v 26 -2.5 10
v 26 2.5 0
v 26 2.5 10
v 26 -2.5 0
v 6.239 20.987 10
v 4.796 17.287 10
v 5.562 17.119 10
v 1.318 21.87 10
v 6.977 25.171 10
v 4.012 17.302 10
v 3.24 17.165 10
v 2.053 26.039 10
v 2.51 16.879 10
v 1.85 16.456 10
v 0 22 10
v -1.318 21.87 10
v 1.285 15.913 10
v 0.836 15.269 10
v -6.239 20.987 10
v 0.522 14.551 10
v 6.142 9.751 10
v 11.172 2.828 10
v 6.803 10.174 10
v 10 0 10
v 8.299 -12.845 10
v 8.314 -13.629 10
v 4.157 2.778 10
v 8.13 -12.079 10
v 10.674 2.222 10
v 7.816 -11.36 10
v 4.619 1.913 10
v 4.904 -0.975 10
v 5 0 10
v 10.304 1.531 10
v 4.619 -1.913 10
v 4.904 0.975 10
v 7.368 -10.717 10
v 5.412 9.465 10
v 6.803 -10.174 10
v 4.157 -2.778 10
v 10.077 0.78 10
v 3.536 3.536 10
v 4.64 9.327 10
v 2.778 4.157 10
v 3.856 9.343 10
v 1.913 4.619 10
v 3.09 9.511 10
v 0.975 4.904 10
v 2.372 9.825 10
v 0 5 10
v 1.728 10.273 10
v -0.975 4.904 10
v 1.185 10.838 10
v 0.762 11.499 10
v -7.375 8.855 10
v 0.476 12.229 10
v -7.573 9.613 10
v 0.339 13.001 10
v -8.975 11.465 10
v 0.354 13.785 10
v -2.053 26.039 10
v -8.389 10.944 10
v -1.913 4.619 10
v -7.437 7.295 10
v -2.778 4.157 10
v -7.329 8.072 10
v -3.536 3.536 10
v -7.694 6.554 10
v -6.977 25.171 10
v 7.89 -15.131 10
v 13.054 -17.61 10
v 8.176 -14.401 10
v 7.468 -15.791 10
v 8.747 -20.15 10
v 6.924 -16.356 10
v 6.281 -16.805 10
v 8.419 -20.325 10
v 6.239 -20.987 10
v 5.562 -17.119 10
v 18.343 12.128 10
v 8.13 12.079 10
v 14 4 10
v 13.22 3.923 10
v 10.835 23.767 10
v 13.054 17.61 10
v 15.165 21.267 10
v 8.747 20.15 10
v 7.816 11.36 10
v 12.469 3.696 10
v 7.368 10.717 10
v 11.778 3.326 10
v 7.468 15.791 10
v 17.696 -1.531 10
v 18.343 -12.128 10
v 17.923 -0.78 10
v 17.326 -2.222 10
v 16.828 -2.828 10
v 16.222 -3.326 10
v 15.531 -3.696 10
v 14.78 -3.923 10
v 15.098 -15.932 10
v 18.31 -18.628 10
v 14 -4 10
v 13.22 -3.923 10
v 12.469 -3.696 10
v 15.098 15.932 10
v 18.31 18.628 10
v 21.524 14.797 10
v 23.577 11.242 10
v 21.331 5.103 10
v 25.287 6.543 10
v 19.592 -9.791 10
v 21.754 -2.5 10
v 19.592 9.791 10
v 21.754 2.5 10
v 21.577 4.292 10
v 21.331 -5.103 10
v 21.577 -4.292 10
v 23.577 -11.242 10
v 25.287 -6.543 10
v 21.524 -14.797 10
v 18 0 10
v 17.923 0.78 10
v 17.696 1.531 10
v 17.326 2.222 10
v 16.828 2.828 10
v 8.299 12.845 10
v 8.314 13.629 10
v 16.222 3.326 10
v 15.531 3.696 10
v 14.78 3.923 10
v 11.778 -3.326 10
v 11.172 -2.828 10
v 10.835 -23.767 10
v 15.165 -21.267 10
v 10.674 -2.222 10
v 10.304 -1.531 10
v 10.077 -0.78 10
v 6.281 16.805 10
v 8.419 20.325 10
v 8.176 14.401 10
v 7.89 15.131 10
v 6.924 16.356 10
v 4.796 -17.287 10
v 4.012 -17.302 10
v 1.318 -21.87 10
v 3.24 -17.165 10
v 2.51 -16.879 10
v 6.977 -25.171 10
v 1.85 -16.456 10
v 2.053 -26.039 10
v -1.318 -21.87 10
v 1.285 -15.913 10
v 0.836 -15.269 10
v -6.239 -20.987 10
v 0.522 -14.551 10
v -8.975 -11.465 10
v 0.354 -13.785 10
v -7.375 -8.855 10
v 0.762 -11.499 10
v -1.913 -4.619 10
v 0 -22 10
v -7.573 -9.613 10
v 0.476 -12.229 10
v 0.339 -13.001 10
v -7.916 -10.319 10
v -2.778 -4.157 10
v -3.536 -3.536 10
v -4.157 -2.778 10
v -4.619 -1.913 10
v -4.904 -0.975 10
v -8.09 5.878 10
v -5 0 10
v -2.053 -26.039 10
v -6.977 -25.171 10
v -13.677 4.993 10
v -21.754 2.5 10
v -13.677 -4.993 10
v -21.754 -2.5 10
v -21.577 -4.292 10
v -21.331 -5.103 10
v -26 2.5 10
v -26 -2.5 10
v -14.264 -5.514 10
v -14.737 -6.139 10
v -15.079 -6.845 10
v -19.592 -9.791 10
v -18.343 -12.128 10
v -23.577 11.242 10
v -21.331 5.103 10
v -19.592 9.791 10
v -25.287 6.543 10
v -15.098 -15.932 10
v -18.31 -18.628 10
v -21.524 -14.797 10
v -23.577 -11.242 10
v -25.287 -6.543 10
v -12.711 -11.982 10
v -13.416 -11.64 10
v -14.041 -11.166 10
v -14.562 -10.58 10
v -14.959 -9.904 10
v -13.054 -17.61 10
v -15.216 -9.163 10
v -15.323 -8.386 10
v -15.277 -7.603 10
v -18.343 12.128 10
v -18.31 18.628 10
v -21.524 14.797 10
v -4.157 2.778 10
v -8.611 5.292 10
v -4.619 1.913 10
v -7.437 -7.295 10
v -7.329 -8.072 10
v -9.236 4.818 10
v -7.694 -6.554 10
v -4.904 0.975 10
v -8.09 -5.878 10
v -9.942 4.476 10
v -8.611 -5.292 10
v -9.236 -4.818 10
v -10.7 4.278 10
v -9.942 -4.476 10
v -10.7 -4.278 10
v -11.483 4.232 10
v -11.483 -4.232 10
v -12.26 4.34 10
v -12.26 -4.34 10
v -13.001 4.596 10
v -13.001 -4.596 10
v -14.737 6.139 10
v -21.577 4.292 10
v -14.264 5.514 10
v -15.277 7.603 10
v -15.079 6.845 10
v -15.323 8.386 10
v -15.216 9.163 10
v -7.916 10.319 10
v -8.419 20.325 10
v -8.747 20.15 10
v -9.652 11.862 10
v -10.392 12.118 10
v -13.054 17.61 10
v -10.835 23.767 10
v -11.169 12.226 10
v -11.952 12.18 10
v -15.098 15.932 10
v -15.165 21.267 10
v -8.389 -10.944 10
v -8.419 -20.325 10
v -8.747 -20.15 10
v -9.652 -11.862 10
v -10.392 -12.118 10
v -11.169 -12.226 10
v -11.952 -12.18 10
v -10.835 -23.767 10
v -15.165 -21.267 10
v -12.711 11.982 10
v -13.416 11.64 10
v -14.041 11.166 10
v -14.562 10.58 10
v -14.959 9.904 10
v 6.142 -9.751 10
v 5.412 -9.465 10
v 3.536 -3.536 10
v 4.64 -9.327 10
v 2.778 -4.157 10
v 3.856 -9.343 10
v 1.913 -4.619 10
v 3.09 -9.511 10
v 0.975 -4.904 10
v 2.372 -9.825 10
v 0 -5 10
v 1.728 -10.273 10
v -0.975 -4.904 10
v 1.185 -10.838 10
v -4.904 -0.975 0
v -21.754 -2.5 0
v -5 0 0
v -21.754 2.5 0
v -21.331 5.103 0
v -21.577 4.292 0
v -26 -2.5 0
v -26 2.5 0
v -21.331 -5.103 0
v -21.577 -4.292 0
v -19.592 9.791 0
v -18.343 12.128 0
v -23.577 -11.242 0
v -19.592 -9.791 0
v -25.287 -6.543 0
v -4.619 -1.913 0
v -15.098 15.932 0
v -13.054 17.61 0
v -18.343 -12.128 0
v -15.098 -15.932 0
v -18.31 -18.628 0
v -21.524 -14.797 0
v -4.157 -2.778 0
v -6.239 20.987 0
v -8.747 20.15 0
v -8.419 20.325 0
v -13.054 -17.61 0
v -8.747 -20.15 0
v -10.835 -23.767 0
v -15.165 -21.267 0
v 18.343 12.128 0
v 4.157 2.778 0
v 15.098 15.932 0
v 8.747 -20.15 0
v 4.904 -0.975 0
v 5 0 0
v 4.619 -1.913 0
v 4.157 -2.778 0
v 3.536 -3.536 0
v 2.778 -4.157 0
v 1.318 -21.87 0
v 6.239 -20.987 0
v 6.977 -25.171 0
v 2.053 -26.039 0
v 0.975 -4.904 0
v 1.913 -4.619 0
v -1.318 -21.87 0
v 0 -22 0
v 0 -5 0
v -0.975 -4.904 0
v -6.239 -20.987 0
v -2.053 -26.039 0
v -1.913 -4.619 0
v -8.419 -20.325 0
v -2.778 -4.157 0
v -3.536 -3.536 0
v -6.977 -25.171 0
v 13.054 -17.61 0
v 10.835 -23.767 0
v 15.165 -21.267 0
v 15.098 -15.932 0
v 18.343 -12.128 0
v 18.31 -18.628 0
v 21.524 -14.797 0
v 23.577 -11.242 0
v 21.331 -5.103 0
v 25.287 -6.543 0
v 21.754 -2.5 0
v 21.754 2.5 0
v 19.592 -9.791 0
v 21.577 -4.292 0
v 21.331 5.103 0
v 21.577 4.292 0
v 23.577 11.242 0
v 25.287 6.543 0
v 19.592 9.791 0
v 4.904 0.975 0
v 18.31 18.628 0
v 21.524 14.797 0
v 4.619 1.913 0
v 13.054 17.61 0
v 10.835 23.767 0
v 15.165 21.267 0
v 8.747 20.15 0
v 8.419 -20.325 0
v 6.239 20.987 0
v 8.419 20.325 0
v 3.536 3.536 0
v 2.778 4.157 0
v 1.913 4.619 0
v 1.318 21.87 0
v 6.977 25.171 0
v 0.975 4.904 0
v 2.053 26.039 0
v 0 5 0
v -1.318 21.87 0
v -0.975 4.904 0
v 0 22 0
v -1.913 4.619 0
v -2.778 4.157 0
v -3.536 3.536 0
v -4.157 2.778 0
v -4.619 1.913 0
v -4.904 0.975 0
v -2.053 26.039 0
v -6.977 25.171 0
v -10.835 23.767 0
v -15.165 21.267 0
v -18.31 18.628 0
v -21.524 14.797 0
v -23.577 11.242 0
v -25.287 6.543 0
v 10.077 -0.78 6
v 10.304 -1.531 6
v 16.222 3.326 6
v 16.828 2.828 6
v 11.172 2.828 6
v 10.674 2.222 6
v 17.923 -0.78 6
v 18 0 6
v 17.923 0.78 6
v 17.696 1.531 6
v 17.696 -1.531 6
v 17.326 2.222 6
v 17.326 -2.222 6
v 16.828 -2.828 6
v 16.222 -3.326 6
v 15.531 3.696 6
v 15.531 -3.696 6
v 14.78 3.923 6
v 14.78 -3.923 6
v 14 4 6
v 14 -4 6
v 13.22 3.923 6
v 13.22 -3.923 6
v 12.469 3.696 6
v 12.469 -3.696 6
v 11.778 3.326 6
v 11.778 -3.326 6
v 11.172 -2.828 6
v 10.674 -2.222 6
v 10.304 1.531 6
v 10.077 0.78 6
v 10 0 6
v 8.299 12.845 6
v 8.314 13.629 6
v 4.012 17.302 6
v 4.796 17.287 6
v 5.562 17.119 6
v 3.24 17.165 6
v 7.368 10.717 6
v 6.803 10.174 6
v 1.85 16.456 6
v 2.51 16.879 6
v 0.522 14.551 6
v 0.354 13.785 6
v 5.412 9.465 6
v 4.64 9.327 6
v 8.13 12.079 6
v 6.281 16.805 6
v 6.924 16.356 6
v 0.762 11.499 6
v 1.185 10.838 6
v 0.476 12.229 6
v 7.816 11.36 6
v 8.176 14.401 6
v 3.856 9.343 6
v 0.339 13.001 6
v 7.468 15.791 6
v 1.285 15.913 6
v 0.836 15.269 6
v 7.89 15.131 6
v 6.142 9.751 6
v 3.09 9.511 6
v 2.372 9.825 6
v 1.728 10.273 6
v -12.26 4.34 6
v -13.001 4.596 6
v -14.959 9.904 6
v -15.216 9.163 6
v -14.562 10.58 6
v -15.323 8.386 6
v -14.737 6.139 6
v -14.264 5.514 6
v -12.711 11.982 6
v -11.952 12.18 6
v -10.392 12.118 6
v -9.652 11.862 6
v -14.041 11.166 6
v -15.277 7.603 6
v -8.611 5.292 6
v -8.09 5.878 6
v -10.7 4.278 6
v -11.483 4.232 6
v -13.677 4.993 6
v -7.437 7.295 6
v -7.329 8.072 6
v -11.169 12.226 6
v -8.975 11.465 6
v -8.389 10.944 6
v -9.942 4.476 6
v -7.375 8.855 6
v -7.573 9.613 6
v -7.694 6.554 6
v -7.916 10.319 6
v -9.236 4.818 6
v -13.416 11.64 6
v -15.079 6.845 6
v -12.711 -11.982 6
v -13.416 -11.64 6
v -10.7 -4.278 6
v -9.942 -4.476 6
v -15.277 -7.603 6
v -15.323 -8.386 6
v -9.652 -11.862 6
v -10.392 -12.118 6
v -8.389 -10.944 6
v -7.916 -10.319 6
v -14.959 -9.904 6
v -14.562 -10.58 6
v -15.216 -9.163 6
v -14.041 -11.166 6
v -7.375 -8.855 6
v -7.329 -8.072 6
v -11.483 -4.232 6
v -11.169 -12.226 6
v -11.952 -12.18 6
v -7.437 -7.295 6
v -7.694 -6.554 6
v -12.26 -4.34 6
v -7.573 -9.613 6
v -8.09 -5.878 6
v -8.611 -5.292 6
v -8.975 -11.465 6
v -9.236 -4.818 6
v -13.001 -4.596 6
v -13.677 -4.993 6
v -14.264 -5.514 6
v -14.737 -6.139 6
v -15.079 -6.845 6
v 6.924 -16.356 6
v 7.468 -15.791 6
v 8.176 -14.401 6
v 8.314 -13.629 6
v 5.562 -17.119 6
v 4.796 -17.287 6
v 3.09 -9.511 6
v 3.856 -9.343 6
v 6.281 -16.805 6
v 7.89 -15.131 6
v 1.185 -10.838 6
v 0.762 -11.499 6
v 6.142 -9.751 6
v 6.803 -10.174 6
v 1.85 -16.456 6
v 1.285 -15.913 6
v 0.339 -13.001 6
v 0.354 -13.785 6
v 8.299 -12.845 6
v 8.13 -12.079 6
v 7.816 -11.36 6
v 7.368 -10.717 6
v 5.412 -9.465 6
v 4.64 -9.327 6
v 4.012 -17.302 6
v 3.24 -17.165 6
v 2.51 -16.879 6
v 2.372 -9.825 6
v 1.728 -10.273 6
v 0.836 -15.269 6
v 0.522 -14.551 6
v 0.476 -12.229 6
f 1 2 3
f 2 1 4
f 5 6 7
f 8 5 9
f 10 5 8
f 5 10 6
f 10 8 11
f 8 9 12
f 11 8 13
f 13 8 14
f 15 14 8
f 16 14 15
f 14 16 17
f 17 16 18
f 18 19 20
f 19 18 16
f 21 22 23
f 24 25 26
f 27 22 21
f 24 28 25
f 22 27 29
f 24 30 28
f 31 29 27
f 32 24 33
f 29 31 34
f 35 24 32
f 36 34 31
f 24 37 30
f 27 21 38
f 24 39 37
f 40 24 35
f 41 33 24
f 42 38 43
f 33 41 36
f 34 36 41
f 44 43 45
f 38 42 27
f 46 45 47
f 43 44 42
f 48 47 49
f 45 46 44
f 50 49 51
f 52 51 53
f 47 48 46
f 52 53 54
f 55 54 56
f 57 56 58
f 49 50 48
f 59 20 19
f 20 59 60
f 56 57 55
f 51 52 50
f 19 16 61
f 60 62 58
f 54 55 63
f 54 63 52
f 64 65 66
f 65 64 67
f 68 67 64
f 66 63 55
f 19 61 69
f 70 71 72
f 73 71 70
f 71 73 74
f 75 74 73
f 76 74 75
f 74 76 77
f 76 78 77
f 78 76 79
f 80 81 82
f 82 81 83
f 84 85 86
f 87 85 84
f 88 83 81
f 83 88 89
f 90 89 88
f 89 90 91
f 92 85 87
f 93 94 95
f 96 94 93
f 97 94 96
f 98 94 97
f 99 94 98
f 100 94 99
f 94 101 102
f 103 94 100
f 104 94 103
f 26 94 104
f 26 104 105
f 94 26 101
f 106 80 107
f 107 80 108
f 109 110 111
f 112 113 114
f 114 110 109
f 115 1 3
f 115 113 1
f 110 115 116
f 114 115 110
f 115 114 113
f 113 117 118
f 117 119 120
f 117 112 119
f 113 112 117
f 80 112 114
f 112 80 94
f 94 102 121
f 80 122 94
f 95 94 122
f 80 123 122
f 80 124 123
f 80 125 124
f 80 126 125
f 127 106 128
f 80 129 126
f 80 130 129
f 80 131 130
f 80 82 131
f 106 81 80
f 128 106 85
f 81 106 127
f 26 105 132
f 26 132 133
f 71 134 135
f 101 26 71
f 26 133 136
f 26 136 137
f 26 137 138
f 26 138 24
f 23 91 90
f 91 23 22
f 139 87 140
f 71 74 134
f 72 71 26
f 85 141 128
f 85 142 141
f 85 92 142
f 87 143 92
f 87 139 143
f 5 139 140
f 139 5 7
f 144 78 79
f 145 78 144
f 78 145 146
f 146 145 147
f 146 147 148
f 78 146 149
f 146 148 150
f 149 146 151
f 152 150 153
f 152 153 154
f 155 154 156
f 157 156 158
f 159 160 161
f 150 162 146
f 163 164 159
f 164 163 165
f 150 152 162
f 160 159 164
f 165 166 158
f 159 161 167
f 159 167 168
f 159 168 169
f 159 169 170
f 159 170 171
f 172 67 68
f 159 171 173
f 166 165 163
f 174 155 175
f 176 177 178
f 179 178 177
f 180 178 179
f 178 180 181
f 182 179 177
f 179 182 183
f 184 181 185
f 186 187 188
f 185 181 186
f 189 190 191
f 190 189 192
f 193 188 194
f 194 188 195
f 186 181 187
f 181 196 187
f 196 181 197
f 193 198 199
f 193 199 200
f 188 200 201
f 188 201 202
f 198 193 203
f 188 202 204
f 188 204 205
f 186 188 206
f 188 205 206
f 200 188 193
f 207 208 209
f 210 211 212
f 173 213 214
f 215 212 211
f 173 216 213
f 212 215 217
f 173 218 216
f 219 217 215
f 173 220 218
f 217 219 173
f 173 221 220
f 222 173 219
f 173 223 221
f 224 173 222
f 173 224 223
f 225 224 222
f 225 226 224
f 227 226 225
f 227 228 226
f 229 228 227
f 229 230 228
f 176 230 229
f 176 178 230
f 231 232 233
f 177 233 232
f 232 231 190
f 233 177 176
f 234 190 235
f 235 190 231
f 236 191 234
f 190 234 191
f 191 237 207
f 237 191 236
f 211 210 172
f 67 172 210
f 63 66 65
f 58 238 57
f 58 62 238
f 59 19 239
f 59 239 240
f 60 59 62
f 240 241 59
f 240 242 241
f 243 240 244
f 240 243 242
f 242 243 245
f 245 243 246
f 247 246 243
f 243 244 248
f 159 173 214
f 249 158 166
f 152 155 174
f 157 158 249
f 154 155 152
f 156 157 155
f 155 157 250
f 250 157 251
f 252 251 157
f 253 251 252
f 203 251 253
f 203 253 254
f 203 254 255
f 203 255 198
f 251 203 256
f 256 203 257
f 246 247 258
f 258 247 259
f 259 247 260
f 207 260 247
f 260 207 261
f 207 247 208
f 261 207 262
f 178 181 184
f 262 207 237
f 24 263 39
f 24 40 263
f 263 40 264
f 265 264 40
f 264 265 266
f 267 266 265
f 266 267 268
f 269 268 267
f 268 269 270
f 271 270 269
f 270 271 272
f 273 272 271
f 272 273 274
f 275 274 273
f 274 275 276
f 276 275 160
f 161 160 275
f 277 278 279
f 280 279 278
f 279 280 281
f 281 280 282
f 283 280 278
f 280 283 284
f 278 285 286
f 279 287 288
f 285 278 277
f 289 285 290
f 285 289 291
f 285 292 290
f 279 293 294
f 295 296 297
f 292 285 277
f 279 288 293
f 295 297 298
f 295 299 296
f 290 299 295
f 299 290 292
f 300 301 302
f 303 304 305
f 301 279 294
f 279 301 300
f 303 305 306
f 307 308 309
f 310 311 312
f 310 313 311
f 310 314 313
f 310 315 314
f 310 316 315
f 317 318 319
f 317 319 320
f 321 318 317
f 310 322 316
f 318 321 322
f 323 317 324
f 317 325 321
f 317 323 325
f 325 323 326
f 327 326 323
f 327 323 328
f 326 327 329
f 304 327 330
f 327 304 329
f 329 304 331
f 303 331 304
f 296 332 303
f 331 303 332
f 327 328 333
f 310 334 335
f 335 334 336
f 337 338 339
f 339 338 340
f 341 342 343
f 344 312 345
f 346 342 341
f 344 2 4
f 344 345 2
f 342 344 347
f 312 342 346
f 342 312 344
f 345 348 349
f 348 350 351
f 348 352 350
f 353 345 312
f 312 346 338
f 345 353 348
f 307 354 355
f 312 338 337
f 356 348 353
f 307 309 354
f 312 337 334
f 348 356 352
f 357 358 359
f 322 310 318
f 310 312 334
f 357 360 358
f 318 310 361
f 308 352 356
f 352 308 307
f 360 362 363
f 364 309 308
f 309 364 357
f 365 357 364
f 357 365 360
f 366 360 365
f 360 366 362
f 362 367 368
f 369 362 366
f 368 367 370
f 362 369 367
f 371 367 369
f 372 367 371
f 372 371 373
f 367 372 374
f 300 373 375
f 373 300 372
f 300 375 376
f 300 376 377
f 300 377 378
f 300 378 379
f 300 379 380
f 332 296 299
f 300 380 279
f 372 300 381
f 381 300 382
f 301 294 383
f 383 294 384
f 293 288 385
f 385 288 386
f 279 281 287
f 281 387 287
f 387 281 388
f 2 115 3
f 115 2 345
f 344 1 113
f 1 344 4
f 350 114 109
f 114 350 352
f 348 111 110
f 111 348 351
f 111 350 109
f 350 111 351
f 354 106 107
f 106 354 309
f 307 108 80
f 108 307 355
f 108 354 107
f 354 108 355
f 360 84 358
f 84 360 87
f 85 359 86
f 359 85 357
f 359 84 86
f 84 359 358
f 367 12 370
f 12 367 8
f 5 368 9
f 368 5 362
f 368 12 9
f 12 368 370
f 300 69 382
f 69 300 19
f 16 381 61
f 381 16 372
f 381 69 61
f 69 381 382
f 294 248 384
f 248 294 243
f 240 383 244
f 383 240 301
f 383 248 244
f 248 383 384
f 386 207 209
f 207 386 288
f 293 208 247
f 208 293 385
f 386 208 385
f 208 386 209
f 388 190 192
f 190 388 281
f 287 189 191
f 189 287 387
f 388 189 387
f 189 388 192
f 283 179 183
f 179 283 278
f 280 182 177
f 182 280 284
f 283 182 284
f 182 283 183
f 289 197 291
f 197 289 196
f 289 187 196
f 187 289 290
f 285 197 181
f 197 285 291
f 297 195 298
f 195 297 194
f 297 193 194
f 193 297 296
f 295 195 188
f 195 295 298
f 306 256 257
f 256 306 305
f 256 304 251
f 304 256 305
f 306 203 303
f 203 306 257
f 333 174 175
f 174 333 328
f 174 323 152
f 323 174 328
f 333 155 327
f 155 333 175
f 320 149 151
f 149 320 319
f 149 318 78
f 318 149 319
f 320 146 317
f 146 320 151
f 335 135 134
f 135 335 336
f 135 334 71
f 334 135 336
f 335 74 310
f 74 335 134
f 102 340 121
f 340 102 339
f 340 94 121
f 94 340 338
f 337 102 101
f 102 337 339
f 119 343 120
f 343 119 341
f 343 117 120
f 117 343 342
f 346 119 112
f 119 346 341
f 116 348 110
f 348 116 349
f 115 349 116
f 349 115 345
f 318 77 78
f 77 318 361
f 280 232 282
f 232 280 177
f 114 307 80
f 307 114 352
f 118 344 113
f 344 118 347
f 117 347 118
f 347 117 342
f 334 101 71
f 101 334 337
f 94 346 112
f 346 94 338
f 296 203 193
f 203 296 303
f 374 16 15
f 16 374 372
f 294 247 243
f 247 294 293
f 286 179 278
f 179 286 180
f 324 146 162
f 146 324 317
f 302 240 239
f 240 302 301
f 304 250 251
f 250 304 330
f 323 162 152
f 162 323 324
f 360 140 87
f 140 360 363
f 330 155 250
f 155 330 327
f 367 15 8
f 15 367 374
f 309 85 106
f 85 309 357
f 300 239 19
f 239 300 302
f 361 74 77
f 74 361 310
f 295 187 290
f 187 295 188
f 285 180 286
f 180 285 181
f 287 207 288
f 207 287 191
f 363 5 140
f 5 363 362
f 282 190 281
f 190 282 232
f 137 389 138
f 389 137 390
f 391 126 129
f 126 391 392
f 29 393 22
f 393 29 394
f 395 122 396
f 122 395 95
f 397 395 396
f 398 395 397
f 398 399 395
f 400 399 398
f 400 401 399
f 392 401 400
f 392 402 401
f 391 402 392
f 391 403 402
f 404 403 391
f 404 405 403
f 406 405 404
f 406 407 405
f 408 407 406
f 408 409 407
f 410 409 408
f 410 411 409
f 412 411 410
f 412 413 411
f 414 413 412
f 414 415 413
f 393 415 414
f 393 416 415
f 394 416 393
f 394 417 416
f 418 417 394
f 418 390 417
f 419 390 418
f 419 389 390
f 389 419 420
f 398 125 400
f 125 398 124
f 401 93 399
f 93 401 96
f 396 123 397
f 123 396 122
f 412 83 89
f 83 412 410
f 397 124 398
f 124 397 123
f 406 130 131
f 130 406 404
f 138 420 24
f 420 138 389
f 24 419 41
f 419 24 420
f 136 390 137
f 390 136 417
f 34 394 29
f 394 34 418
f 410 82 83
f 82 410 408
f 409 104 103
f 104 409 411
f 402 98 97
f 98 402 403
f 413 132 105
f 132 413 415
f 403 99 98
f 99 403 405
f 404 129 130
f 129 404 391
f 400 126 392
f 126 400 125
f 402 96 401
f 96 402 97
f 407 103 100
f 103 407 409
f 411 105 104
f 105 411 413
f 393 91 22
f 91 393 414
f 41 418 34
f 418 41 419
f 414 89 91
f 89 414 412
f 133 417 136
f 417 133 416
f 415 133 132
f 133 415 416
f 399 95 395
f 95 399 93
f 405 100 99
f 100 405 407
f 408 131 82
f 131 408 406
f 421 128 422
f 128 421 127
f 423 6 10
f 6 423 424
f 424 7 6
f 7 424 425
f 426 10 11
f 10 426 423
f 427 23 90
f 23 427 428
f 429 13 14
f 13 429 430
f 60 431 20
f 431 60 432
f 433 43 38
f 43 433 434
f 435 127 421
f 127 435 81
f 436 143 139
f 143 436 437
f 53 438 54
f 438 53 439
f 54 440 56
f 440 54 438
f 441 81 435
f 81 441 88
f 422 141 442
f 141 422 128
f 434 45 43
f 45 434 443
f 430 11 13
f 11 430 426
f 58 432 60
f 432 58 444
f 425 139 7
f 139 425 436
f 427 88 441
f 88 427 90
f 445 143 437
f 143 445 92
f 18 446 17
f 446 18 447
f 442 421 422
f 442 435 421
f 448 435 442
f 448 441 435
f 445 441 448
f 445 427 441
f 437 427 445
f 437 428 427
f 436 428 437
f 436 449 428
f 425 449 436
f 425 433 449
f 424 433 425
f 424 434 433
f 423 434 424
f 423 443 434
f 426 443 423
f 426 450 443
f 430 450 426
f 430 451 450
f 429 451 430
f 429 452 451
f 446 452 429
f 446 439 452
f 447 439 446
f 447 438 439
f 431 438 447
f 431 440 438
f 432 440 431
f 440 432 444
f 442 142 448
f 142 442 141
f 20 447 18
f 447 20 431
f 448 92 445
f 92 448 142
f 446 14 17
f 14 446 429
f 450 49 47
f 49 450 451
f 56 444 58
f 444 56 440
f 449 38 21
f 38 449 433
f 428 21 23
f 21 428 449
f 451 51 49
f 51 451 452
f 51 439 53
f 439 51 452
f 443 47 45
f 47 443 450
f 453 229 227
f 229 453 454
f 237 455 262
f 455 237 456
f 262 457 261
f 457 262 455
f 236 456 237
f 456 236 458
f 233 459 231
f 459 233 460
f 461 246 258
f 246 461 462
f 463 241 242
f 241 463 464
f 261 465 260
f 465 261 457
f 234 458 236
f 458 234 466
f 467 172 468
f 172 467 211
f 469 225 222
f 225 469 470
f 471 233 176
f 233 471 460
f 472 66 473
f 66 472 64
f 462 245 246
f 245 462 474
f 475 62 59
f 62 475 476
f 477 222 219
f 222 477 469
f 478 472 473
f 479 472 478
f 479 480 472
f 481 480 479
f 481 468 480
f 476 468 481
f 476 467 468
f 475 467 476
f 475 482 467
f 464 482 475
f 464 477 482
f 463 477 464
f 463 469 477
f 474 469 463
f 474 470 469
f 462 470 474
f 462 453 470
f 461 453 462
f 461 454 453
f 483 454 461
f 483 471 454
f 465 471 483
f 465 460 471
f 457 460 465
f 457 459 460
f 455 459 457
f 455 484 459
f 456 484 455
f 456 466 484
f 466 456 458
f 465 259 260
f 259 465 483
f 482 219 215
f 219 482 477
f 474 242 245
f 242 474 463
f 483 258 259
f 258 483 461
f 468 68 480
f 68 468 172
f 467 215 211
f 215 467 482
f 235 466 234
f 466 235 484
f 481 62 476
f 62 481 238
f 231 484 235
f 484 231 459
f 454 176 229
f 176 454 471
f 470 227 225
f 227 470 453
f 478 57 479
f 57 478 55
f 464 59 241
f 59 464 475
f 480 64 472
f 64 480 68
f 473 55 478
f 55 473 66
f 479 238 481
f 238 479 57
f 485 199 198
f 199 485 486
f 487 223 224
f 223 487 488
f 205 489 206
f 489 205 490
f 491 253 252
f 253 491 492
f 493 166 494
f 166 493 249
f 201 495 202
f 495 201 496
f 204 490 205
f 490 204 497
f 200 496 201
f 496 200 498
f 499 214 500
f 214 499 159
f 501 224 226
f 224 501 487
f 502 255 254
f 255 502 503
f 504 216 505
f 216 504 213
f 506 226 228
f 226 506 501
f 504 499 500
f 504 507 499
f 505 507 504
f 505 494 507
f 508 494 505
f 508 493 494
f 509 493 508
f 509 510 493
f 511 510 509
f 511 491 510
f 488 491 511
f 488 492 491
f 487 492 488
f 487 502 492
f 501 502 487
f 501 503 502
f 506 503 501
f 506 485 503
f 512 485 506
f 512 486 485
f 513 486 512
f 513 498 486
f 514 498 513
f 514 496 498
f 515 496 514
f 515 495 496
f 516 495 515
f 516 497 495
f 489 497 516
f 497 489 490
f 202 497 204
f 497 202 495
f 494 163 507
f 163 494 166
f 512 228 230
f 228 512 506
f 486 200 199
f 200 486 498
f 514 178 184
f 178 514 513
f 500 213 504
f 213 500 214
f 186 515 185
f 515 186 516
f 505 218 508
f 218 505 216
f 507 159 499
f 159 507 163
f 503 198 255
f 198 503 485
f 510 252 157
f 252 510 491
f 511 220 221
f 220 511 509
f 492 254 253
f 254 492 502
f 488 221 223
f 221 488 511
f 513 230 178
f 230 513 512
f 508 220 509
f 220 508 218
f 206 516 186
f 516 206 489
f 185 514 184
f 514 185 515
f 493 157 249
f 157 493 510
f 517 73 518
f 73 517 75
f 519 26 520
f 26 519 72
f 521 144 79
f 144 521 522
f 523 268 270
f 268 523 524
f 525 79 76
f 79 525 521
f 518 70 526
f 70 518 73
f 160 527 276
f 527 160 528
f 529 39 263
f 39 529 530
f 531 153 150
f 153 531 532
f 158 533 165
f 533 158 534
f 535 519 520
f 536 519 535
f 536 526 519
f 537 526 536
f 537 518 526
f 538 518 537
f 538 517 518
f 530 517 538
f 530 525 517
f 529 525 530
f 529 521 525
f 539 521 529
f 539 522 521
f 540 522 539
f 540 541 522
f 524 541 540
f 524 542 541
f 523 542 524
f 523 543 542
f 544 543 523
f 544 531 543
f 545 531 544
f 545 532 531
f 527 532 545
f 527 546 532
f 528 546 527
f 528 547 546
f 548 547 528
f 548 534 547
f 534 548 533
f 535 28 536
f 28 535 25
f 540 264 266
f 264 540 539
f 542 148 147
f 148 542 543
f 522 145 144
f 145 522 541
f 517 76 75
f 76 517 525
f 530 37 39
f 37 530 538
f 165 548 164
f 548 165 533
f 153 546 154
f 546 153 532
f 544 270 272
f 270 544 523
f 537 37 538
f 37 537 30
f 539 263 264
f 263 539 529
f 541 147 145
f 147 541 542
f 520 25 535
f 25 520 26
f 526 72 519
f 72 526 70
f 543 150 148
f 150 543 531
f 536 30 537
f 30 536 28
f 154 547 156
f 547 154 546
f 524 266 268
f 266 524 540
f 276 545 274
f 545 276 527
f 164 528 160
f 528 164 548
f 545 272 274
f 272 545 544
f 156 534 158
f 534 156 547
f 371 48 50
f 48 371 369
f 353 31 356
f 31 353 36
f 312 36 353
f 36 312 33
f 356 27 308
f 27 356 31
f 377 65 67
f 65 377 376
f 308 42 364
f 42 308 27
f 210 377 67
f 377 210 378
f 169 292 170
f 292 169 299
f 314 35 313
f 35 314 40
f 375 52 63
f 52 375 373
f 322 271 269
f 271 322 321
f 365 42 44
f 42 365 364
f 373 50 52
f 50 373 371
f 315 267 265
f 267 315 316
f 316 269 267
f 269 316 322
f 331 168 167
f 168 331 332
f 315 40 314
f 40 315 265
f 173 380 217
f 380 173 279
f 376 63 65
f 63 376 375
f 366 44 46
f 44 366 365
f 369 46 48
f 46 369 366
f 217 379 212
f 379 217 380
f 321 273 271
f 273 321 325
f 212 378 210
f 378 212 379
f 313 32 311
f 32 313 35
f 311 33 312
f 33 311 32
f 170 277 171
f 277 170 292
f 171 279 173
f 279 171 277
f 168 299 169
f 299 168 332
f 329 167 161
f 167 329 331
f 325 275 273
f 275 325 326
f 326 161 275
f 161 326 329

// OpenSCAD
$fn = 32;

// ----------------------------------------------------------------------
// Spur blank: lightened gear blank
// ----------------------------------------------------------------------

// --- parameters (mm) ---
disc_r = 22;              // blank root radius
disc_t = 10;              // blank thickness
n_teeth = 18;             // stub tooth count
tooth_w = 5;              // tooth width at the root
tooth_h = 4;              // tooth height above the root
bore_r = 5;               // central bore radius
ring_r = 14;              // lightening pocket ring radius
pocket_r = 4;             // lightening pocket radius

out_r = disc_r + tooth_h;  // tip radius
bbox_x = 52.0;  // measured width over the teeth
bbox_y = 52.08;  // measured depth over the teeth

difference() {
union() {
  cylinder(r = disc_r, h = disc_t);
  for (i = [0 : n_teeth - 1])
    rotate([0, 0, i * 360 / n_teeth])
      translate([disc_r - 1, -tooth_w / 2, 0])
        cube([tooth_h + 1, tooth_w, disc_t]);
}
  translate([0, 0, -1]) cylinder(r = bore_r, h = disc_t + 2);
  for (i = [0 : 5])
    rotate([0, 0, i * 72])
      translate([ring_r, 0, disc_t - 4])
        cylinder(r = pocket_r, h = 5);
}
